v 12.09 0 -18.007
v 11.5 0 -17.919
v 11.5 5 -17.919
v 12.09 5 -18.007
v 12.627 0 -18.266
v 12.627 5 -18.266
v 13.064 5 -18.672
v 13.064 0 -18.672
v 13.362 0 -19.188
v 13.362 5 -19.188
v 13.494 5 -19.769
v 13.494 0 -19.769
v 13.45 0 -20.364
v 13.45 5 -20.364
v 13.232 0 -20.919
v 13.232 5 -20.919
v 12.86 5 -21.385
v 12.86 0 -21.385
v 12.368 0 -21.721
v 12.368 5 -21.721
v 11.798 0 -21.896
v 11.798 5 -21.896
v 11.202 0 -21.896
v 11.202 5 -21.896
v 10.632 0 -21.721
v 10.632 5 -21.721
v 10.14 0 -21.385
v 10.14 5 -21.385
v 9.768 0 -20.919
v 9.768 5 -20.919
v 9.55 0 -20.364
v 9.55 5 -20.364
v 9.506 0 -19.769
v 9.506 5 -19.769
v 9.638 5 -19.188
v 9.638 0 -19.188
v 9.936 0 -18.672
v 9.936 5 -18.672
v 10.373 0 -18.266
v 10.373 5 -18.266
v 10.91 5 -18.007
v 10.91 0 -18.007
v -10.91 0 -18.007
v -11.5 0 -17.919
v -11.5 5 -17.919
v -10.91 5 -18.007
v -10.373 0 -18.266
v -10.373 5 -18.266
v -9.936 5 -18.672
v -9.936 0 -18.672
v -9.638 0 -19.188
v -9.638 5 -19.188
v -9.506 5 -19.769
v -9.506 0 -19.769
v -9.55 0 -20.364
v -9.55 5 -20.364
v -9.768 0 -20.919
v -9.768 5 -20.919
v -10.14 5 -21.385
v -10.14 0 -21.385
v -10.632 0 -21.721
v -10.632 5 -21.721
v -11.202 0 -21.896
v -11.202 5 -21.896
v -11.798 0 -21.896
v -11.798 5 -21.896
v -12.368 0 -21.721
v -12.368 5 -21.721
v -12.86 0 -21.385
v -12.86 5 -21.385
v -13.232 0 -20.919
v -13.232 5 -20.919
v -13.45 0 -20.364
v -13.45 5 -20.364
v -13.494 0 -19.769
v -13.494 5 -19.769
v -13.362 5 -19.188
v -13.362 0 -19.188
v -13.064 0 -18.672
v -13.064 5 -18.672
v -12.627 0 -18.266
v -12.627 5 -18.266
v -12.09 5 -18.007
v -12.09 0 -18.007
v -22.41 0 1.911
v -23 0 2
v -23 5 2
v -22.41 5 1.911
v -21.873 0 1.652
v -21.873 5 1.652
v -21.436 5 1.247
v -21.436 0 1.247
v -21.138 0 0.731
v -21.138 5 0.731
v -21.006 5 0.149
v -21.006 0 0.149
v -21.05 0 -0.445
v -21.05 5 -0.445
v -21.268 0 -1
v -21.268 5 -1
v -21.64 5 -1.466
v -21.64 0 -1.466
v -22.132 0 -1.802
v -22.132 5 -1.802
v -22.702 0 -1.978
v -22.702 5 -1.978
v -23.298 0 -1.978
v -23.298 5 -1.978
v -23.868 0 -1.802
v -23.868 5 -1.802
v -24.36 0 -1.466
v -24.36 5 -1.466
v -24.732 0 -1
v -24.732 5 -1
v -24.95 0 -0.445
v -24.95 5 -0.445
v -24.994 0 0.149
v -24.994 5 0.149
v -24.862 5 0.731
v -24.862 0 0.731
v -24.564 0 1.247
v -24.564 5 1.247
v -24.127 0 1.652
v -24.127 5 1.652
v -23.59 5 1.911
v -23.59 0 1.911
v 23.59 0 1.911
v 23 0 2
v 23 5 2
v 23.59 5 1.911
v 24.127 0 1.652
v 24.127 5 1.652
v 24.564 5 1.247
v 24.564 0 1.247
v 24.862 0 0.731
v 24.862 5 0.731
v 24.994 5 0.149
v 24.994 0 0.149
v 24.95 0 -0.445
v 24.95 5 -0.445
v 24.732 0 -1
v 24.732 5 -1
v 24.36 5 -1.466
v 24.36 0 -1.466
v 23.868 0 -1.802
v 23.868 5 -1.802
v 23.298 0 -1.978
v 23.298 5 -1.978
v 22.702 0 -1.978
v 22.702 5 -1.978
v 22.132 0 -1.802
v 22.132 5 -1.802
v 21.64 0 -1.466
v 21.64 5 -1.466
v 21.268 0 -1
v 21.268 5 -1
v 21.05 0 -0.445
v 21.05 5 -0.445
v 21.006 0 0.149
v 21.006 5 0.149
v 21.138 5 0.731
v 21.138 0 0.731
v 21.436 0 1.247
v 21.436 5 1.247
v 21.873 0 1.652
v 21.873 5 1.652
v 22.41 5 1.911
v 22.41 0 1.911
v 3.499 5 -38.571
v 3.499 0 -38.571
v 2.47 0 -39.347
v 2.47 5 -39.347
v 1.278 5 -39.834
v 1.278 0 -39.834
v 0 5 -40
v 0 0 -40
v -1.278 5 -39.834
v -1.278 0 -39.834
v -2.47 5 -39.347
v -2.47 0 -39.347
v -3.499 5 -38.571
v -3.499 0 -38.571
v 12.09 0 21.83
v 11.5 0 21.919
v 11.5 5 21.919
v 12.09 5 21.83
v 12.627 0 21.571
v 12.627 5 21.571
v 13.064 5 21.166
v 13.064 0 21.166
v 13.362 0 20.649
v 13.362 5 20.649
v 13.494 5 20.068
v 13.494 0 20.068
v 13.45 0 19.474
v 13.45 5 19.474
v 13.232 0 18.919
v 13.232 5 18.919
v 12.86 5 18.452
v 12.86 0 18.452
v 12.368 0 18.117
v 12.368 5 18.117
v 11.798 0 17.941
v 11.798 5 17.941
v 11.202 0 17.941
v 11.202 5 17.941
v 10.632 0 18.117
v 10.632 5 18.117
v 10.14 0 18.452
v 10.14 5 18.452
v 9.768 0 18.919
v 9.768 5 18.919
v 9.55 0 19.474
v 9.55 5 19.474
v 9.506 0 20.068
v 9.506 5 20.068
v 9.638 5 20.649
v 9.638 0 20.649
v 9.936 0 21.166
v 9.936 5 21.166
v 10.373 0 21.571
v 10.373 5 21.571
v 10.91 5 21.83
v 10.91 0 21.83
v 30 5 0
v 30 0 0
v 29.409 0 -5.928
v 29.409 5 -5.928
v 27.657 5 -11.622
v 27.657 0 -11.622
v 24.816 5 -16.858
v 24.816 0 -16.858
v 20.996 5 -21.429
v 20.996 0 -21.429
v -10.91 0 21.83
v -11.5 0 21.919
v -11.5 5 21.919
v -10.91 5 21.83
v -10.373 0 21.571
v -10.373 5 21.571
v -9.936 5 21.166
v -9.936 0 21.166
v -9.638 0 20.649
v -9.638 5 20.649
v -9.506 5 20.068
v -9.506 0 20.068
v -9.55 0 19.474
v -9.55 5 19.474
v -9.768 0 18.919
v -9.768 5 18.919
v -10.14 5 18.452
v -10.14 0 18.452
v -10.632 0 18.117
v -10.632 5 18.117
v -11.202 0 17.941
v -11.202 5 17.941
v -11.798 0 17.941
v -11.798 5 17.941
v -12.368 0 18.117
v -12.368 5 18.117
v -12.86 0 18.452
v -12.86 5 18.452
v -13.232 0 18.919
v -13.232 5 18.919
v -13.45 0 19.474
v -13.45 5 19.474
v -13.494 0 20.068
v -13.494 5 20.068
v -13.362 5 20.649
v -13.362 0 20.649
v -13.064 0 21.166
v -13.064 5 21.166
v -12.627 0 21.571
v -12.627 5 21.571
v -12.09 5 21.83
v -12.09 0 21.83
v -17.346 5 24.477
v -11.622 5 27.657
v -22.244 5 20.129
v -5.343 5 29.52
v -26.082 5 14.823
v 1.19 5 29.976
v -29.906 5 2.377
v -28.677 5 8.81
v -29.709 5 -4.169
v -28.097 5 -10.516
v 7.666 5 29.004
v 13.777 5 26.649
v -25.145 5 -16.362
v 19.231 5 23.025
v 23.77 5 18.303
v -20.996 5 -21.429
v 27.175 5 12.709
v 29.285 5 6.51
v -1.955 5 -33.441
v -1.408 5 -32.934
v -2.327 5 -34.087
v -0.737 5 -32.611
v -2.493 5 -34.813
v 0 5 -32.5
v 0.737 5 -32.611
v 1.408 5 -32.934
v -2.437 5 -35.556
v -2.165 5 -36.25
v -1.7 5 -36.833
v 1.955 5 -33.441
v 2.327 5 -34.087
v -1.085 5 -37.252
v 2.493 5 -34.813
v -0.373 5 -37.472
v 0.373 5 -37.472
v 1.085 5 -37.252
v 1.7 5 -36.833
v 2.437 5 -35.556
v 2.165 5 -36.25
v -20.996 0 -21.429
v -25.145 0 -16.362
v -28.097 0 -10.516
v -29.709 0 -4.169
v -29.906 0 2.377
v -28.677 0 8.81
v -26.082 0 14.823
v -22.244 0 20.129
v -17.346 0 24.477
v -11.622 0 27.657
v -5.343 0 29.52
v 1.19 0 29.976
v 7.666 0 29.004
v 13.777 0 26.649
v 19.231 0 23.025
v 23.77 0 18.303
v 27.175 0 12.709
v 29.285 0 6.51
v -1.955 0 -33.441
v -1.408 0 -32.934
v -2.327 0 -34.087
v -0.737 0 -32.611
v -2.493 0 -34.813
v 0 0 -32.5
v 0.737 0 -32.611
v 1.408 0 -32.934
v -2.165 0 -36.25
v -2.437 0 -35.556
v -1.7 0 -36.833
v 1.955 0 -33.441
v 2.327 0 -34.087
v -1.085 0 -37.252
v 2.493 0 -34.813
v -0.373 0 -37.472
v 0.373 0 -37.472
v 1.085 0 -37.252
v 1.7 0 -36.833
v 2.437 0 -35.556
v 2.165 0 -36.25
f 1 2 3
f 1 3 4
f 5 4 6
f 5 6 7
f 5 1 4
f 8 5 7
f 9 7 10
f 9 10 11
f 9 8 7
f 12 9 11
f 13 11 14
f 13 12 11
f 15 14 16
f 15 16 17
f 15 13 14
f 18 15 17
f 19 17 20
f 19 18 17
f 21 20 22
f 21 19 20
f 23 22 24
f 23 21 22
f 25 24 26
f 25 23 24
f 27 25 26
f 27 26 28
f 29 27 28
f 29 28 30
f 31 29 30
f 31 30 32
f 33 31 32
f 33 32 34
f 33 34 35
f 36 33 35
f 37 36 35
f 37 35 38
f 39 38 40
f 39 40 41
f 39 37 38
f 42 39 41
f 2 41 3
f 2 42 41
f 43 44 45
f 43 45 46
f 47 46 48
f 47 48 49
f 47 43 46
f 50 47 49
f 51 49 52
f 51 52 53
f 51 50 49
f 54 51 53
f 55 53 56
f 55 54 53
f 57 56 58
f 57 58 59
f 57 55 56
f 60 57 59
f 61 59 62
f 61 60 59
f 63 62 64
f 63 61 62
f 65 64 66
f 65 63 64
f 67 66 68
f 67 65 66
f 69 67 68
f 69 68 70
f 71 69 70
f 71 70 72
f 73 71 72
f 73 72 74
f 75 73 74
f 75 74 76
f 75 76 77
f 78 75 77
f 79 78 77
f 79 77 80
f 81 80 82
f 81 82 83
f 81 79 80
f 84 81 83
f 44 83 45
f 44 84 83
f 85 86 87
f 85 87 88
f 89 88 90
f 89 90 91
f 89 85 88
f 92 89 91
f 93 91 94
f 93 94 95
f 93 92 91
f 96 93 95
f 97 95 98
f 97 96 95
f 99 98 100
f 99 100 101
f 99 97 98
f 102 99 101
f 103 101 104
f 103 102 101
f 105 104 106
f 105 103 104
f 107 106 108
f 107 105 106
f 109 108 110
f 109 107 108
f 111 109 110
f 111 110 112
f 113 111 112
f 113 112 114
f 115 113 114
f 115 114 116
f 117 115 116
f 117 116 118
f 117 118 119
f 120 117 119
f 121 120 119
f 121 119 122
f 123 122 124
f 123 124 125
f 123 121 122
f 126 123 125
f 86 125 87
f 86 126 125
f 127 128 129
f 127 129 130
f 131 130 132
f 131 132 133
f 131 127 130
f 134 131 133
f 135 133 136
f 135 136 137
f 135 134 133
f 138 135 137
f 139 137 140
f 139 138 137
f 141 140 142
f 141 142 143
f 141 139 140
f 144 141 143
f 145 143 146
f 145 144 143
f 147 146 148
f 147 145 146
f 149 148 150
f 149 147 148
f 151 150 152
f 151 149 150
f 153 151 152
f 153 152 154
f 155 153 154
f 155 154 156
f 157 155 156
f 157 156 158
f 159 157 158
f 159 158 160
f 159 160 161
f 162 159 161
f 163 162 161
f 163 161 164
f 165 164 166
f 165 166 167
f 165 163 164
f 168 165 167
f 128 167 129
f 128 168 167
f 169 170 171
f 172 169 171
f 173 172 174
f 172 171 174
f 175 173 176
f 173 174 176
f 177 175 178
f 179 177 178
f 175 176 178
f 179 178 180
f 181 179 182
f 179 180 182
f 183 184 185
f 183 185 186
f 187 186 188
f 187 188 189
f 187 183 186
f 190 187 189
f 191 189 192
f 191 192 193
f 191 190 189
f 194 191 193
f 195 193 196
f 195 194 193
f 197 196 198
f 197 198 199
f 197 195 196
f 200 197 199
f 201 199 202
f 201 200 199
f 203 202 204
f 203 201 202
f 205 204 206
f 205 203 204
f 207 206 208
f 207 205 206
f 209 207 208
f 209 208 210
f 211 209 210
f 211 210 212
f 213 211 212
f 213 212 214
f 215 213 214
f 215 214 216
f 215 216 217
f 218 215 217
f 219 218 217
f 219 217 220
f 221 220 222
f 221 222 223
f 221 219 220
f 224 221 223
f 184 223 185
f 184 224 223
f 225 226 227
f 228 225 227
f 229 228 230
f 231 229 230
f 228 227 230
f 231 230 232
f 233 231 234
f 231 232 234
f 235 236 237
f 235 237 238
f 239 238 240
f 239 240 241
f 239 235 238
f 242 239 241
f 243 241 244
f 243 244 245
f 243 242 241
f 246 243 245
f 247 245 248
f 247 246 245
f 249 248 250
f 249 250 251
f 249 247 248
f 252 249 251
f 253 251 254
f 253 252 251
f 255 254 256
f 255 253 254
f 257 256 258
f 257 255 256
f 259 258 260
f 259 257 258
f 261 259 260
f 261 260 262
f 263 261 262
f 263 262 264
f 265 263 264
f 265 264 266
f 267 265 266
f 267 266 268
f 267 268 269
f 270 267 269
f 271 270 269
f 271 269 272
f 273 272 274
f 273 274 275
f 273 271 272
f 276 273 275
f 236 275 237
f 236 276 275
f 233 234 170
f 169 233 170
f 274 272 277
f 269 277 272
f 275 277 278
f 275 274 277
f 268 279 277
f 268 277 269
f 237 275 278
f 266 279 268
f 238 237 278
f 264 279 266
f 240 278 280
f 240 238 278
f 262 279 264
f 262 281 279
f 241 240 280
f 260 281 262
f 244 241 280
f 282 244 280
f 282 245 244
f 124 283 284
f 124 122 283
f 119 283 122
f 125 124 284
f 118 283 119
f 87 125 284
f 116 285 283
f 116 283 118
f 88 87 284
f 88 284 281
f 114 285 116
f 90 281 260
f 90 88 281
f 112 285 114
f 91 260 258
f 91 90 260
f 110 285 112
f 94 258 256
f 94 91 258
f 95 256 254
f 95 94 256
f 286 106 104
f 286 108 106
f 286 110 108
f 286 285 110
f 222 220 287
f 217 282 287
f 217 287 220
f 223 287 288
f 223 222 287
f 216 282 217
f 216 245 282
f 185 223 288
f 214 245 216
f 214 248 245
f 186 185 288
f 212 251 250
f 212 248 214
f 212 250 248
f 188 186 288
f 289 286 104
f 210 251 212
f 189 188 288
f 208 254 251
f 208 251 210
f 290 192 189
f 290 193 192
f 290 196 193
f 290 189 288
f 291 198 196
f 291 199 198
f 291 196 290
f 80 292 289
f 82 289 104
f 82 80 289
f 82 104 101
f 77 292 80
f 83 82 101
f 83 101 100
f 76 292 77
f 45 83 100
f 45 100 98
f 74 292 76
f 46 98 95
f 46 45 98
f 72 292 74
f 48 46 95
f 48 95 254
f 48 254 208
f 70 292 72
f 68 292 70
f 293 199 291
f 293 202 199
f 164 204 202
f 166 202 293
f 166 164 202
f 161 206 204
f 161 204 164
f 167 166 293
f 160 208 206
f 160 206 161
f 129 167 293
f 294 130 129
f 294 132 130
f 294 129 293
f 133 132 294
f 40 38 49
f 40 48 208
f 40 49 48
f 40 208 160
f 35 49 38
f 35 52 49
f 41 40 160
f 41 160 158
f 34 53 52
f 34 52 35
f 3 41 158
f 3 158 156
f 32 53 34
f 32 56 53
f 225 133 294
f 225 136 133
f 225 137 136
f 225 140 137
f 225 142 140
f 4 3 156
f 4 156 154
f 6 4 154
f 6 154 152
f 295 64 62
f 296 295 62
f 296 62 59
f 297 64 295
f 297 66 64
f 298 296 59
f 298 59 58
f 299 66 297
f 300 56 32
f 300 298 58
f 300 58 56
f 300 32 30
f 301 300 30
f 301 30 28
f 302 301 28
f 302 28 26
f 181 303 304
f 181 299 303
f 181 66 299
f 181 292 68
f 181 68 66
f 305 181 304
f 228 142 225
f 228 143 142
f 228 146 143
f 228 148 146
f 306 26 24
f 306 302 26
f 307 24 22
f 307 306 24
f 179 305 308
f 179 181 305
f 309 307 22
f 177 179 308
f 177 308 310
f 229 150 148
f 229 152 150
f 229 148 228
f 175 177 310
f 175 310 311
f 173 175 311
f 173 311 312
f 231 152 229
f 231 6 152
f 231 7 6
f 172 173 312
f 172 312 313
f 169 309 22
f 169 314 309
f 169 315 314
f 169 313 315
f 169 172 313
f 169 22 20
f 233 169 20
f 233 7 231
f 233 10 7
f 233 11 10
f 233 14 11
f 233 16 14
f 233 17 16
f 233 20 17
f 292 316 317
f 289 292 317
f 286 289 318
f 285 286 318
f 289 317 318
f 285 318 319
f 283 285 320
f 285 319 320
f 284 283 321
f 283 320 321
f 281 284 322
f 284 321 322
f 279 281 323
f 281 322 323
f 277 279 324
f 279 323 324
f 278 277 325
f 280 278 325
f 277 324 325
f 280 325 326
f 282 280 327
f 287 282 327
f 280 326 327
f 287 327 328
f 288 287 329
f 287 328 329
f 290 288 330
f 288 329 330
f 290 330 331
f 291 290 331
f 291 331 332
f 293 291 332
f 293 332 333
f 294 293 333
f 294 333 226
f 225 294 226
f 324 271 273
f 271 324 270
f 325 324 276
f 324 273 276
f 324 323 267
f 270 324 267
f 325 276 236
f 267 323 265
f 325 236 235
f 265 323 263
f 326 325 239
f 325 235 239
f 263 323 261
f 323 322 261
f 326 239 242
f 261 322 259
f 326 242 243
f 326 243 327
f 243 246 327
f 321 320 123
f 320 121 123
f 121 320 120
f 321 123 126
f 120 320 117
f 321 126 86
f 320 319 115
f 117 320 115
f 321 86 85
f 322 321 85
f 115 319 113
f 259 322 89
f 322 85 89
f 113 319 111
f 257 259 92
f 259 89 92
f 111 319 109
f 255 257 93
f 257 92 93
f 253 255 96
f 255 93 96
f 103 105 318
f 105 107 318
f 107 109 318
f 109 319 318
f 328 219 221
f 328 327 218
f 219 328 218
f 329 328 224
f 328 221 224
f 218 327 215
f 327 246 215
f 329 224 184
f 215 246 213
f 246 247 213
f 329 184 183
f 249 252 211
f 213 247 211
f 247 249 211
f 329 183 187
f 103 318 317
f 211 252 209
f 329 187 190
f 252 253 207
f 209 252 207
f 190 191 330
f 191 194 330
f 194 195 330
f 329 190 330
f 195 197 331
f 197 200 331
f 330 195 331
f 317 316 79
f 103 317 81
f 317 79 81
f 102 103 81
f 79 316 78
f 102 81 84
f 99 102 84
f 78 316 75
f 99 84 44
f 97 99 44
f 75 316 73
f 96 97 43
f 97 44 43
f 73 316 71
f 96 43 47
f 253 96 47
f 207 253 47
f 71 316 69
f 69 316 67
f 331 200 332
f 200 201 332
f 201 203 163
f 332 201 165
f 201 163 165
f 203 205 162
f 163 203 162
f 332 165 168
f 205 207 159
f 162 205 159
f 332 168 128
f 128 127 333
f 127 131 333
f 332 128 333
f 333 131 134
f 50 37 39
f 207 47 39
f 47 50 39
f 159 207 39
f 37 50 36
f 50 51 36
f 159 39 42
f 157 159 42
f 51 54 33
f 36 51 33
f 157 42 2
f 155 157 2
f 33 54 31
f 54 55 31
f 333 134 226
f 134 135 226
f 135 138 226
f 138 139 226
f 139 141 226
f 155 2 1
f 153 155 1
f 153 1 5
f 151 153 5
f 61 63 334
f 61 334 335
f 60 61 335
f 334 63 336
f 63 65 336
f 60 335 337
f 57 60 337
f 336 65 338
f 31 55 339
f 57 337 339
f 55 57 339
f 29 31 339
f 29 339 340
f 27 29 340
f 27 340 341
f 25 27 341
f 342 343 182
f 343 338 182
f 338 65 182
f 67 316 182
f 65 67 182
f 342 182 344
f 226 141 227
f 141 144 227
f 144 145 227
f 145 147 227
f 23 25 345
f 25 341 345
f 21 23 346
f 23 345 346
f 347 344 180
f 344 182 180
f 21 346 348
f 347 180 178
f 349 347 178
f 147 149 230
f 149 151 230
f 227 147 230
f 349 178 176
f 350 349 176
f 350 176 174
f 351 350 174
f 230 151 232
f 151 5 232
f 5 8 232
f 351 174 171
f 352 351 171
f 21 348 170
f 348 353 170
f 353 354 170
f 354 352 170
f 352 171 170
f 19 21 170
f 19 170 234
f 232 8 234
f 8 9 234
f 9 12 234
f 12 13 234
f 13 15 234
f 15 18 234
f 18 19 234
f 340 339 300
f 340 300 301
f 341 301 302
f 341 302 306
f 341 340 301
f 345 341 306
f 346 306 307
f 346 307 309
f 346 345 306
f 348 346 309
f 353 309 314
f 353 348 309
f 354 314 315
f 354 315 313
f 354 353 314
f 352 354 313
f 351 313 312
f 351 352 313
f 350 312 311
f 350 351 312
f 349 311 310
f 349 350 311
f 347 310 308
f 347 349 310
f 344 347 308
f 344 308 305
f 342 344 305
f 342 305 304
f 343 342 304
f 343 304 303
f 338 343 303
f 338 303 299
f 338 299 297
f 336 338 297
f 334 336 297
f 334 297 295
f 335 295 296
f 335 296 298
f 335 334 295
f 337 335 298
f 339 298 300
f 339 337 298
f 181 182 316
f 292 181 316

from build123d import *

# Parameters (mm, degrees)
SKETCH1_R           = 2
SKETCH1_R_2         = 5
SKETCH1_R_3         = 2.5
BOSS_EXTRUDE1_DEPTH = 5


with BuildPart() as part:
    # Sketch1 → Boss-Extrude1 (new body)
    # profile 1 of 4: a face of its own
    with BuildSketch(Plane(origin=(0, 0, 0), x_dir=(1, 0, 0), z_dir=(0, 1, 0))):
        with BuildLine():
            ThreePointArc((-1.9e-08, 30), (-11.338934199, 27.77460299), (-20.995626367, 21.428571429))
            ThreePointArc((-20.995626367, 21.428571429), (-11.621772864, -27.657447379), (30, 0))
            ThreePointArc((30, 0), (27.657447379, 11.621772864), (20.995626367, 21.428571429))
            ThreePointArc((20.995626367, 21.428571429), (11.338934182, 27.774602997), (-1.9e-08, 30))
        make_face()
        with Locations(Location((-11.5, -19.918584287, 0), (0, 0, 270))):
            Circle(SKETCH1_R, mode=Mode.SUBTRACT)
        with Locations(Location((-23, 0, 0), (0, 0, 270))):
            Circle(SKETCH1_R, mode=Mode.SUBTRACT)
        with Locations(Location((11.5, -19.918584287, 0), (0, 0, 270))):
            Circle(SKETCH1_R, mode=Mode.SUBTRACT)
        with Locations(Location((23, 0, 0), (0, 0, 270))):
            Circle(SKETCH1_R, mode=Mode.SUBTRACT)
        with Locations(Location((-11.5, 19.918584287, 0), (0, 0, 270))):
            Circle(SKETCH1_R, mode=Mode.SUBTRACT)
        with Locations(Location((11.5, 19.918584287, 0), (0, 0, 270))):
            Circle(SKETCH1_R, mode=Mode.SUBTRACT)
    # profile 2 of 4: a face of its own
    with BuildSketch(Plane(origin=(0, 0, 0), x_dir=(1, 0, 0), z_dir=(0, 1, 0))):
        with BuildLine():
            Line((20.995626367, 21.428571429), (3.499271061, 38.571428571))
            ThreePointArc((3.499271061, 38.571428571), (4.609574563, 36.936962144), (5, 35))
            ThreePointArc((5, 35), (3.535533899, 31.464466087), (-1.9e-08, 30))
            ThreePointArc((-1.9e-08, 30), (11.338934182, 27.774602997), (20.995626367, 21.428571429))
        make_face()
    # profile 3 of 4: a face of its own
    with BuildSketch(Plane(origin=(0, 0, 0), x_dir=(1, 0, 0), z_dir=(0, 1, 0))):
        with BuildLine():
            ThreePointArc((-1.9e-08, 30), (-4.629100502, 33.110177644), (-3.499271061, 38.571428571))
            Line((-3.499271061, 38.571428571), (-20.995626367, 21.428571429))
            ThreePointArc((-20.995626367, 21.428571429), (-11.338934199, 27.77460299), (-1.9e-08, 30))
        make_face()
    # profile 4 of 4: a face of its own
    with BuildSketch(Plane(origin=(0, 0, 0), x_dir=(1, 0, 0), z_dir=(0, 1, 0))):
        with Locations((0, 35)):
            Circle(SKETCH1_R_2)
        with Locations(Location((0, 35, 0), (0, 0, 270))):
            Circle(SKETCH1_R_3, mode=Mode.SUBTRACT)
    extrude(amount=BOSS_EXTRUDE1_DEPTH)


solid = part.part
